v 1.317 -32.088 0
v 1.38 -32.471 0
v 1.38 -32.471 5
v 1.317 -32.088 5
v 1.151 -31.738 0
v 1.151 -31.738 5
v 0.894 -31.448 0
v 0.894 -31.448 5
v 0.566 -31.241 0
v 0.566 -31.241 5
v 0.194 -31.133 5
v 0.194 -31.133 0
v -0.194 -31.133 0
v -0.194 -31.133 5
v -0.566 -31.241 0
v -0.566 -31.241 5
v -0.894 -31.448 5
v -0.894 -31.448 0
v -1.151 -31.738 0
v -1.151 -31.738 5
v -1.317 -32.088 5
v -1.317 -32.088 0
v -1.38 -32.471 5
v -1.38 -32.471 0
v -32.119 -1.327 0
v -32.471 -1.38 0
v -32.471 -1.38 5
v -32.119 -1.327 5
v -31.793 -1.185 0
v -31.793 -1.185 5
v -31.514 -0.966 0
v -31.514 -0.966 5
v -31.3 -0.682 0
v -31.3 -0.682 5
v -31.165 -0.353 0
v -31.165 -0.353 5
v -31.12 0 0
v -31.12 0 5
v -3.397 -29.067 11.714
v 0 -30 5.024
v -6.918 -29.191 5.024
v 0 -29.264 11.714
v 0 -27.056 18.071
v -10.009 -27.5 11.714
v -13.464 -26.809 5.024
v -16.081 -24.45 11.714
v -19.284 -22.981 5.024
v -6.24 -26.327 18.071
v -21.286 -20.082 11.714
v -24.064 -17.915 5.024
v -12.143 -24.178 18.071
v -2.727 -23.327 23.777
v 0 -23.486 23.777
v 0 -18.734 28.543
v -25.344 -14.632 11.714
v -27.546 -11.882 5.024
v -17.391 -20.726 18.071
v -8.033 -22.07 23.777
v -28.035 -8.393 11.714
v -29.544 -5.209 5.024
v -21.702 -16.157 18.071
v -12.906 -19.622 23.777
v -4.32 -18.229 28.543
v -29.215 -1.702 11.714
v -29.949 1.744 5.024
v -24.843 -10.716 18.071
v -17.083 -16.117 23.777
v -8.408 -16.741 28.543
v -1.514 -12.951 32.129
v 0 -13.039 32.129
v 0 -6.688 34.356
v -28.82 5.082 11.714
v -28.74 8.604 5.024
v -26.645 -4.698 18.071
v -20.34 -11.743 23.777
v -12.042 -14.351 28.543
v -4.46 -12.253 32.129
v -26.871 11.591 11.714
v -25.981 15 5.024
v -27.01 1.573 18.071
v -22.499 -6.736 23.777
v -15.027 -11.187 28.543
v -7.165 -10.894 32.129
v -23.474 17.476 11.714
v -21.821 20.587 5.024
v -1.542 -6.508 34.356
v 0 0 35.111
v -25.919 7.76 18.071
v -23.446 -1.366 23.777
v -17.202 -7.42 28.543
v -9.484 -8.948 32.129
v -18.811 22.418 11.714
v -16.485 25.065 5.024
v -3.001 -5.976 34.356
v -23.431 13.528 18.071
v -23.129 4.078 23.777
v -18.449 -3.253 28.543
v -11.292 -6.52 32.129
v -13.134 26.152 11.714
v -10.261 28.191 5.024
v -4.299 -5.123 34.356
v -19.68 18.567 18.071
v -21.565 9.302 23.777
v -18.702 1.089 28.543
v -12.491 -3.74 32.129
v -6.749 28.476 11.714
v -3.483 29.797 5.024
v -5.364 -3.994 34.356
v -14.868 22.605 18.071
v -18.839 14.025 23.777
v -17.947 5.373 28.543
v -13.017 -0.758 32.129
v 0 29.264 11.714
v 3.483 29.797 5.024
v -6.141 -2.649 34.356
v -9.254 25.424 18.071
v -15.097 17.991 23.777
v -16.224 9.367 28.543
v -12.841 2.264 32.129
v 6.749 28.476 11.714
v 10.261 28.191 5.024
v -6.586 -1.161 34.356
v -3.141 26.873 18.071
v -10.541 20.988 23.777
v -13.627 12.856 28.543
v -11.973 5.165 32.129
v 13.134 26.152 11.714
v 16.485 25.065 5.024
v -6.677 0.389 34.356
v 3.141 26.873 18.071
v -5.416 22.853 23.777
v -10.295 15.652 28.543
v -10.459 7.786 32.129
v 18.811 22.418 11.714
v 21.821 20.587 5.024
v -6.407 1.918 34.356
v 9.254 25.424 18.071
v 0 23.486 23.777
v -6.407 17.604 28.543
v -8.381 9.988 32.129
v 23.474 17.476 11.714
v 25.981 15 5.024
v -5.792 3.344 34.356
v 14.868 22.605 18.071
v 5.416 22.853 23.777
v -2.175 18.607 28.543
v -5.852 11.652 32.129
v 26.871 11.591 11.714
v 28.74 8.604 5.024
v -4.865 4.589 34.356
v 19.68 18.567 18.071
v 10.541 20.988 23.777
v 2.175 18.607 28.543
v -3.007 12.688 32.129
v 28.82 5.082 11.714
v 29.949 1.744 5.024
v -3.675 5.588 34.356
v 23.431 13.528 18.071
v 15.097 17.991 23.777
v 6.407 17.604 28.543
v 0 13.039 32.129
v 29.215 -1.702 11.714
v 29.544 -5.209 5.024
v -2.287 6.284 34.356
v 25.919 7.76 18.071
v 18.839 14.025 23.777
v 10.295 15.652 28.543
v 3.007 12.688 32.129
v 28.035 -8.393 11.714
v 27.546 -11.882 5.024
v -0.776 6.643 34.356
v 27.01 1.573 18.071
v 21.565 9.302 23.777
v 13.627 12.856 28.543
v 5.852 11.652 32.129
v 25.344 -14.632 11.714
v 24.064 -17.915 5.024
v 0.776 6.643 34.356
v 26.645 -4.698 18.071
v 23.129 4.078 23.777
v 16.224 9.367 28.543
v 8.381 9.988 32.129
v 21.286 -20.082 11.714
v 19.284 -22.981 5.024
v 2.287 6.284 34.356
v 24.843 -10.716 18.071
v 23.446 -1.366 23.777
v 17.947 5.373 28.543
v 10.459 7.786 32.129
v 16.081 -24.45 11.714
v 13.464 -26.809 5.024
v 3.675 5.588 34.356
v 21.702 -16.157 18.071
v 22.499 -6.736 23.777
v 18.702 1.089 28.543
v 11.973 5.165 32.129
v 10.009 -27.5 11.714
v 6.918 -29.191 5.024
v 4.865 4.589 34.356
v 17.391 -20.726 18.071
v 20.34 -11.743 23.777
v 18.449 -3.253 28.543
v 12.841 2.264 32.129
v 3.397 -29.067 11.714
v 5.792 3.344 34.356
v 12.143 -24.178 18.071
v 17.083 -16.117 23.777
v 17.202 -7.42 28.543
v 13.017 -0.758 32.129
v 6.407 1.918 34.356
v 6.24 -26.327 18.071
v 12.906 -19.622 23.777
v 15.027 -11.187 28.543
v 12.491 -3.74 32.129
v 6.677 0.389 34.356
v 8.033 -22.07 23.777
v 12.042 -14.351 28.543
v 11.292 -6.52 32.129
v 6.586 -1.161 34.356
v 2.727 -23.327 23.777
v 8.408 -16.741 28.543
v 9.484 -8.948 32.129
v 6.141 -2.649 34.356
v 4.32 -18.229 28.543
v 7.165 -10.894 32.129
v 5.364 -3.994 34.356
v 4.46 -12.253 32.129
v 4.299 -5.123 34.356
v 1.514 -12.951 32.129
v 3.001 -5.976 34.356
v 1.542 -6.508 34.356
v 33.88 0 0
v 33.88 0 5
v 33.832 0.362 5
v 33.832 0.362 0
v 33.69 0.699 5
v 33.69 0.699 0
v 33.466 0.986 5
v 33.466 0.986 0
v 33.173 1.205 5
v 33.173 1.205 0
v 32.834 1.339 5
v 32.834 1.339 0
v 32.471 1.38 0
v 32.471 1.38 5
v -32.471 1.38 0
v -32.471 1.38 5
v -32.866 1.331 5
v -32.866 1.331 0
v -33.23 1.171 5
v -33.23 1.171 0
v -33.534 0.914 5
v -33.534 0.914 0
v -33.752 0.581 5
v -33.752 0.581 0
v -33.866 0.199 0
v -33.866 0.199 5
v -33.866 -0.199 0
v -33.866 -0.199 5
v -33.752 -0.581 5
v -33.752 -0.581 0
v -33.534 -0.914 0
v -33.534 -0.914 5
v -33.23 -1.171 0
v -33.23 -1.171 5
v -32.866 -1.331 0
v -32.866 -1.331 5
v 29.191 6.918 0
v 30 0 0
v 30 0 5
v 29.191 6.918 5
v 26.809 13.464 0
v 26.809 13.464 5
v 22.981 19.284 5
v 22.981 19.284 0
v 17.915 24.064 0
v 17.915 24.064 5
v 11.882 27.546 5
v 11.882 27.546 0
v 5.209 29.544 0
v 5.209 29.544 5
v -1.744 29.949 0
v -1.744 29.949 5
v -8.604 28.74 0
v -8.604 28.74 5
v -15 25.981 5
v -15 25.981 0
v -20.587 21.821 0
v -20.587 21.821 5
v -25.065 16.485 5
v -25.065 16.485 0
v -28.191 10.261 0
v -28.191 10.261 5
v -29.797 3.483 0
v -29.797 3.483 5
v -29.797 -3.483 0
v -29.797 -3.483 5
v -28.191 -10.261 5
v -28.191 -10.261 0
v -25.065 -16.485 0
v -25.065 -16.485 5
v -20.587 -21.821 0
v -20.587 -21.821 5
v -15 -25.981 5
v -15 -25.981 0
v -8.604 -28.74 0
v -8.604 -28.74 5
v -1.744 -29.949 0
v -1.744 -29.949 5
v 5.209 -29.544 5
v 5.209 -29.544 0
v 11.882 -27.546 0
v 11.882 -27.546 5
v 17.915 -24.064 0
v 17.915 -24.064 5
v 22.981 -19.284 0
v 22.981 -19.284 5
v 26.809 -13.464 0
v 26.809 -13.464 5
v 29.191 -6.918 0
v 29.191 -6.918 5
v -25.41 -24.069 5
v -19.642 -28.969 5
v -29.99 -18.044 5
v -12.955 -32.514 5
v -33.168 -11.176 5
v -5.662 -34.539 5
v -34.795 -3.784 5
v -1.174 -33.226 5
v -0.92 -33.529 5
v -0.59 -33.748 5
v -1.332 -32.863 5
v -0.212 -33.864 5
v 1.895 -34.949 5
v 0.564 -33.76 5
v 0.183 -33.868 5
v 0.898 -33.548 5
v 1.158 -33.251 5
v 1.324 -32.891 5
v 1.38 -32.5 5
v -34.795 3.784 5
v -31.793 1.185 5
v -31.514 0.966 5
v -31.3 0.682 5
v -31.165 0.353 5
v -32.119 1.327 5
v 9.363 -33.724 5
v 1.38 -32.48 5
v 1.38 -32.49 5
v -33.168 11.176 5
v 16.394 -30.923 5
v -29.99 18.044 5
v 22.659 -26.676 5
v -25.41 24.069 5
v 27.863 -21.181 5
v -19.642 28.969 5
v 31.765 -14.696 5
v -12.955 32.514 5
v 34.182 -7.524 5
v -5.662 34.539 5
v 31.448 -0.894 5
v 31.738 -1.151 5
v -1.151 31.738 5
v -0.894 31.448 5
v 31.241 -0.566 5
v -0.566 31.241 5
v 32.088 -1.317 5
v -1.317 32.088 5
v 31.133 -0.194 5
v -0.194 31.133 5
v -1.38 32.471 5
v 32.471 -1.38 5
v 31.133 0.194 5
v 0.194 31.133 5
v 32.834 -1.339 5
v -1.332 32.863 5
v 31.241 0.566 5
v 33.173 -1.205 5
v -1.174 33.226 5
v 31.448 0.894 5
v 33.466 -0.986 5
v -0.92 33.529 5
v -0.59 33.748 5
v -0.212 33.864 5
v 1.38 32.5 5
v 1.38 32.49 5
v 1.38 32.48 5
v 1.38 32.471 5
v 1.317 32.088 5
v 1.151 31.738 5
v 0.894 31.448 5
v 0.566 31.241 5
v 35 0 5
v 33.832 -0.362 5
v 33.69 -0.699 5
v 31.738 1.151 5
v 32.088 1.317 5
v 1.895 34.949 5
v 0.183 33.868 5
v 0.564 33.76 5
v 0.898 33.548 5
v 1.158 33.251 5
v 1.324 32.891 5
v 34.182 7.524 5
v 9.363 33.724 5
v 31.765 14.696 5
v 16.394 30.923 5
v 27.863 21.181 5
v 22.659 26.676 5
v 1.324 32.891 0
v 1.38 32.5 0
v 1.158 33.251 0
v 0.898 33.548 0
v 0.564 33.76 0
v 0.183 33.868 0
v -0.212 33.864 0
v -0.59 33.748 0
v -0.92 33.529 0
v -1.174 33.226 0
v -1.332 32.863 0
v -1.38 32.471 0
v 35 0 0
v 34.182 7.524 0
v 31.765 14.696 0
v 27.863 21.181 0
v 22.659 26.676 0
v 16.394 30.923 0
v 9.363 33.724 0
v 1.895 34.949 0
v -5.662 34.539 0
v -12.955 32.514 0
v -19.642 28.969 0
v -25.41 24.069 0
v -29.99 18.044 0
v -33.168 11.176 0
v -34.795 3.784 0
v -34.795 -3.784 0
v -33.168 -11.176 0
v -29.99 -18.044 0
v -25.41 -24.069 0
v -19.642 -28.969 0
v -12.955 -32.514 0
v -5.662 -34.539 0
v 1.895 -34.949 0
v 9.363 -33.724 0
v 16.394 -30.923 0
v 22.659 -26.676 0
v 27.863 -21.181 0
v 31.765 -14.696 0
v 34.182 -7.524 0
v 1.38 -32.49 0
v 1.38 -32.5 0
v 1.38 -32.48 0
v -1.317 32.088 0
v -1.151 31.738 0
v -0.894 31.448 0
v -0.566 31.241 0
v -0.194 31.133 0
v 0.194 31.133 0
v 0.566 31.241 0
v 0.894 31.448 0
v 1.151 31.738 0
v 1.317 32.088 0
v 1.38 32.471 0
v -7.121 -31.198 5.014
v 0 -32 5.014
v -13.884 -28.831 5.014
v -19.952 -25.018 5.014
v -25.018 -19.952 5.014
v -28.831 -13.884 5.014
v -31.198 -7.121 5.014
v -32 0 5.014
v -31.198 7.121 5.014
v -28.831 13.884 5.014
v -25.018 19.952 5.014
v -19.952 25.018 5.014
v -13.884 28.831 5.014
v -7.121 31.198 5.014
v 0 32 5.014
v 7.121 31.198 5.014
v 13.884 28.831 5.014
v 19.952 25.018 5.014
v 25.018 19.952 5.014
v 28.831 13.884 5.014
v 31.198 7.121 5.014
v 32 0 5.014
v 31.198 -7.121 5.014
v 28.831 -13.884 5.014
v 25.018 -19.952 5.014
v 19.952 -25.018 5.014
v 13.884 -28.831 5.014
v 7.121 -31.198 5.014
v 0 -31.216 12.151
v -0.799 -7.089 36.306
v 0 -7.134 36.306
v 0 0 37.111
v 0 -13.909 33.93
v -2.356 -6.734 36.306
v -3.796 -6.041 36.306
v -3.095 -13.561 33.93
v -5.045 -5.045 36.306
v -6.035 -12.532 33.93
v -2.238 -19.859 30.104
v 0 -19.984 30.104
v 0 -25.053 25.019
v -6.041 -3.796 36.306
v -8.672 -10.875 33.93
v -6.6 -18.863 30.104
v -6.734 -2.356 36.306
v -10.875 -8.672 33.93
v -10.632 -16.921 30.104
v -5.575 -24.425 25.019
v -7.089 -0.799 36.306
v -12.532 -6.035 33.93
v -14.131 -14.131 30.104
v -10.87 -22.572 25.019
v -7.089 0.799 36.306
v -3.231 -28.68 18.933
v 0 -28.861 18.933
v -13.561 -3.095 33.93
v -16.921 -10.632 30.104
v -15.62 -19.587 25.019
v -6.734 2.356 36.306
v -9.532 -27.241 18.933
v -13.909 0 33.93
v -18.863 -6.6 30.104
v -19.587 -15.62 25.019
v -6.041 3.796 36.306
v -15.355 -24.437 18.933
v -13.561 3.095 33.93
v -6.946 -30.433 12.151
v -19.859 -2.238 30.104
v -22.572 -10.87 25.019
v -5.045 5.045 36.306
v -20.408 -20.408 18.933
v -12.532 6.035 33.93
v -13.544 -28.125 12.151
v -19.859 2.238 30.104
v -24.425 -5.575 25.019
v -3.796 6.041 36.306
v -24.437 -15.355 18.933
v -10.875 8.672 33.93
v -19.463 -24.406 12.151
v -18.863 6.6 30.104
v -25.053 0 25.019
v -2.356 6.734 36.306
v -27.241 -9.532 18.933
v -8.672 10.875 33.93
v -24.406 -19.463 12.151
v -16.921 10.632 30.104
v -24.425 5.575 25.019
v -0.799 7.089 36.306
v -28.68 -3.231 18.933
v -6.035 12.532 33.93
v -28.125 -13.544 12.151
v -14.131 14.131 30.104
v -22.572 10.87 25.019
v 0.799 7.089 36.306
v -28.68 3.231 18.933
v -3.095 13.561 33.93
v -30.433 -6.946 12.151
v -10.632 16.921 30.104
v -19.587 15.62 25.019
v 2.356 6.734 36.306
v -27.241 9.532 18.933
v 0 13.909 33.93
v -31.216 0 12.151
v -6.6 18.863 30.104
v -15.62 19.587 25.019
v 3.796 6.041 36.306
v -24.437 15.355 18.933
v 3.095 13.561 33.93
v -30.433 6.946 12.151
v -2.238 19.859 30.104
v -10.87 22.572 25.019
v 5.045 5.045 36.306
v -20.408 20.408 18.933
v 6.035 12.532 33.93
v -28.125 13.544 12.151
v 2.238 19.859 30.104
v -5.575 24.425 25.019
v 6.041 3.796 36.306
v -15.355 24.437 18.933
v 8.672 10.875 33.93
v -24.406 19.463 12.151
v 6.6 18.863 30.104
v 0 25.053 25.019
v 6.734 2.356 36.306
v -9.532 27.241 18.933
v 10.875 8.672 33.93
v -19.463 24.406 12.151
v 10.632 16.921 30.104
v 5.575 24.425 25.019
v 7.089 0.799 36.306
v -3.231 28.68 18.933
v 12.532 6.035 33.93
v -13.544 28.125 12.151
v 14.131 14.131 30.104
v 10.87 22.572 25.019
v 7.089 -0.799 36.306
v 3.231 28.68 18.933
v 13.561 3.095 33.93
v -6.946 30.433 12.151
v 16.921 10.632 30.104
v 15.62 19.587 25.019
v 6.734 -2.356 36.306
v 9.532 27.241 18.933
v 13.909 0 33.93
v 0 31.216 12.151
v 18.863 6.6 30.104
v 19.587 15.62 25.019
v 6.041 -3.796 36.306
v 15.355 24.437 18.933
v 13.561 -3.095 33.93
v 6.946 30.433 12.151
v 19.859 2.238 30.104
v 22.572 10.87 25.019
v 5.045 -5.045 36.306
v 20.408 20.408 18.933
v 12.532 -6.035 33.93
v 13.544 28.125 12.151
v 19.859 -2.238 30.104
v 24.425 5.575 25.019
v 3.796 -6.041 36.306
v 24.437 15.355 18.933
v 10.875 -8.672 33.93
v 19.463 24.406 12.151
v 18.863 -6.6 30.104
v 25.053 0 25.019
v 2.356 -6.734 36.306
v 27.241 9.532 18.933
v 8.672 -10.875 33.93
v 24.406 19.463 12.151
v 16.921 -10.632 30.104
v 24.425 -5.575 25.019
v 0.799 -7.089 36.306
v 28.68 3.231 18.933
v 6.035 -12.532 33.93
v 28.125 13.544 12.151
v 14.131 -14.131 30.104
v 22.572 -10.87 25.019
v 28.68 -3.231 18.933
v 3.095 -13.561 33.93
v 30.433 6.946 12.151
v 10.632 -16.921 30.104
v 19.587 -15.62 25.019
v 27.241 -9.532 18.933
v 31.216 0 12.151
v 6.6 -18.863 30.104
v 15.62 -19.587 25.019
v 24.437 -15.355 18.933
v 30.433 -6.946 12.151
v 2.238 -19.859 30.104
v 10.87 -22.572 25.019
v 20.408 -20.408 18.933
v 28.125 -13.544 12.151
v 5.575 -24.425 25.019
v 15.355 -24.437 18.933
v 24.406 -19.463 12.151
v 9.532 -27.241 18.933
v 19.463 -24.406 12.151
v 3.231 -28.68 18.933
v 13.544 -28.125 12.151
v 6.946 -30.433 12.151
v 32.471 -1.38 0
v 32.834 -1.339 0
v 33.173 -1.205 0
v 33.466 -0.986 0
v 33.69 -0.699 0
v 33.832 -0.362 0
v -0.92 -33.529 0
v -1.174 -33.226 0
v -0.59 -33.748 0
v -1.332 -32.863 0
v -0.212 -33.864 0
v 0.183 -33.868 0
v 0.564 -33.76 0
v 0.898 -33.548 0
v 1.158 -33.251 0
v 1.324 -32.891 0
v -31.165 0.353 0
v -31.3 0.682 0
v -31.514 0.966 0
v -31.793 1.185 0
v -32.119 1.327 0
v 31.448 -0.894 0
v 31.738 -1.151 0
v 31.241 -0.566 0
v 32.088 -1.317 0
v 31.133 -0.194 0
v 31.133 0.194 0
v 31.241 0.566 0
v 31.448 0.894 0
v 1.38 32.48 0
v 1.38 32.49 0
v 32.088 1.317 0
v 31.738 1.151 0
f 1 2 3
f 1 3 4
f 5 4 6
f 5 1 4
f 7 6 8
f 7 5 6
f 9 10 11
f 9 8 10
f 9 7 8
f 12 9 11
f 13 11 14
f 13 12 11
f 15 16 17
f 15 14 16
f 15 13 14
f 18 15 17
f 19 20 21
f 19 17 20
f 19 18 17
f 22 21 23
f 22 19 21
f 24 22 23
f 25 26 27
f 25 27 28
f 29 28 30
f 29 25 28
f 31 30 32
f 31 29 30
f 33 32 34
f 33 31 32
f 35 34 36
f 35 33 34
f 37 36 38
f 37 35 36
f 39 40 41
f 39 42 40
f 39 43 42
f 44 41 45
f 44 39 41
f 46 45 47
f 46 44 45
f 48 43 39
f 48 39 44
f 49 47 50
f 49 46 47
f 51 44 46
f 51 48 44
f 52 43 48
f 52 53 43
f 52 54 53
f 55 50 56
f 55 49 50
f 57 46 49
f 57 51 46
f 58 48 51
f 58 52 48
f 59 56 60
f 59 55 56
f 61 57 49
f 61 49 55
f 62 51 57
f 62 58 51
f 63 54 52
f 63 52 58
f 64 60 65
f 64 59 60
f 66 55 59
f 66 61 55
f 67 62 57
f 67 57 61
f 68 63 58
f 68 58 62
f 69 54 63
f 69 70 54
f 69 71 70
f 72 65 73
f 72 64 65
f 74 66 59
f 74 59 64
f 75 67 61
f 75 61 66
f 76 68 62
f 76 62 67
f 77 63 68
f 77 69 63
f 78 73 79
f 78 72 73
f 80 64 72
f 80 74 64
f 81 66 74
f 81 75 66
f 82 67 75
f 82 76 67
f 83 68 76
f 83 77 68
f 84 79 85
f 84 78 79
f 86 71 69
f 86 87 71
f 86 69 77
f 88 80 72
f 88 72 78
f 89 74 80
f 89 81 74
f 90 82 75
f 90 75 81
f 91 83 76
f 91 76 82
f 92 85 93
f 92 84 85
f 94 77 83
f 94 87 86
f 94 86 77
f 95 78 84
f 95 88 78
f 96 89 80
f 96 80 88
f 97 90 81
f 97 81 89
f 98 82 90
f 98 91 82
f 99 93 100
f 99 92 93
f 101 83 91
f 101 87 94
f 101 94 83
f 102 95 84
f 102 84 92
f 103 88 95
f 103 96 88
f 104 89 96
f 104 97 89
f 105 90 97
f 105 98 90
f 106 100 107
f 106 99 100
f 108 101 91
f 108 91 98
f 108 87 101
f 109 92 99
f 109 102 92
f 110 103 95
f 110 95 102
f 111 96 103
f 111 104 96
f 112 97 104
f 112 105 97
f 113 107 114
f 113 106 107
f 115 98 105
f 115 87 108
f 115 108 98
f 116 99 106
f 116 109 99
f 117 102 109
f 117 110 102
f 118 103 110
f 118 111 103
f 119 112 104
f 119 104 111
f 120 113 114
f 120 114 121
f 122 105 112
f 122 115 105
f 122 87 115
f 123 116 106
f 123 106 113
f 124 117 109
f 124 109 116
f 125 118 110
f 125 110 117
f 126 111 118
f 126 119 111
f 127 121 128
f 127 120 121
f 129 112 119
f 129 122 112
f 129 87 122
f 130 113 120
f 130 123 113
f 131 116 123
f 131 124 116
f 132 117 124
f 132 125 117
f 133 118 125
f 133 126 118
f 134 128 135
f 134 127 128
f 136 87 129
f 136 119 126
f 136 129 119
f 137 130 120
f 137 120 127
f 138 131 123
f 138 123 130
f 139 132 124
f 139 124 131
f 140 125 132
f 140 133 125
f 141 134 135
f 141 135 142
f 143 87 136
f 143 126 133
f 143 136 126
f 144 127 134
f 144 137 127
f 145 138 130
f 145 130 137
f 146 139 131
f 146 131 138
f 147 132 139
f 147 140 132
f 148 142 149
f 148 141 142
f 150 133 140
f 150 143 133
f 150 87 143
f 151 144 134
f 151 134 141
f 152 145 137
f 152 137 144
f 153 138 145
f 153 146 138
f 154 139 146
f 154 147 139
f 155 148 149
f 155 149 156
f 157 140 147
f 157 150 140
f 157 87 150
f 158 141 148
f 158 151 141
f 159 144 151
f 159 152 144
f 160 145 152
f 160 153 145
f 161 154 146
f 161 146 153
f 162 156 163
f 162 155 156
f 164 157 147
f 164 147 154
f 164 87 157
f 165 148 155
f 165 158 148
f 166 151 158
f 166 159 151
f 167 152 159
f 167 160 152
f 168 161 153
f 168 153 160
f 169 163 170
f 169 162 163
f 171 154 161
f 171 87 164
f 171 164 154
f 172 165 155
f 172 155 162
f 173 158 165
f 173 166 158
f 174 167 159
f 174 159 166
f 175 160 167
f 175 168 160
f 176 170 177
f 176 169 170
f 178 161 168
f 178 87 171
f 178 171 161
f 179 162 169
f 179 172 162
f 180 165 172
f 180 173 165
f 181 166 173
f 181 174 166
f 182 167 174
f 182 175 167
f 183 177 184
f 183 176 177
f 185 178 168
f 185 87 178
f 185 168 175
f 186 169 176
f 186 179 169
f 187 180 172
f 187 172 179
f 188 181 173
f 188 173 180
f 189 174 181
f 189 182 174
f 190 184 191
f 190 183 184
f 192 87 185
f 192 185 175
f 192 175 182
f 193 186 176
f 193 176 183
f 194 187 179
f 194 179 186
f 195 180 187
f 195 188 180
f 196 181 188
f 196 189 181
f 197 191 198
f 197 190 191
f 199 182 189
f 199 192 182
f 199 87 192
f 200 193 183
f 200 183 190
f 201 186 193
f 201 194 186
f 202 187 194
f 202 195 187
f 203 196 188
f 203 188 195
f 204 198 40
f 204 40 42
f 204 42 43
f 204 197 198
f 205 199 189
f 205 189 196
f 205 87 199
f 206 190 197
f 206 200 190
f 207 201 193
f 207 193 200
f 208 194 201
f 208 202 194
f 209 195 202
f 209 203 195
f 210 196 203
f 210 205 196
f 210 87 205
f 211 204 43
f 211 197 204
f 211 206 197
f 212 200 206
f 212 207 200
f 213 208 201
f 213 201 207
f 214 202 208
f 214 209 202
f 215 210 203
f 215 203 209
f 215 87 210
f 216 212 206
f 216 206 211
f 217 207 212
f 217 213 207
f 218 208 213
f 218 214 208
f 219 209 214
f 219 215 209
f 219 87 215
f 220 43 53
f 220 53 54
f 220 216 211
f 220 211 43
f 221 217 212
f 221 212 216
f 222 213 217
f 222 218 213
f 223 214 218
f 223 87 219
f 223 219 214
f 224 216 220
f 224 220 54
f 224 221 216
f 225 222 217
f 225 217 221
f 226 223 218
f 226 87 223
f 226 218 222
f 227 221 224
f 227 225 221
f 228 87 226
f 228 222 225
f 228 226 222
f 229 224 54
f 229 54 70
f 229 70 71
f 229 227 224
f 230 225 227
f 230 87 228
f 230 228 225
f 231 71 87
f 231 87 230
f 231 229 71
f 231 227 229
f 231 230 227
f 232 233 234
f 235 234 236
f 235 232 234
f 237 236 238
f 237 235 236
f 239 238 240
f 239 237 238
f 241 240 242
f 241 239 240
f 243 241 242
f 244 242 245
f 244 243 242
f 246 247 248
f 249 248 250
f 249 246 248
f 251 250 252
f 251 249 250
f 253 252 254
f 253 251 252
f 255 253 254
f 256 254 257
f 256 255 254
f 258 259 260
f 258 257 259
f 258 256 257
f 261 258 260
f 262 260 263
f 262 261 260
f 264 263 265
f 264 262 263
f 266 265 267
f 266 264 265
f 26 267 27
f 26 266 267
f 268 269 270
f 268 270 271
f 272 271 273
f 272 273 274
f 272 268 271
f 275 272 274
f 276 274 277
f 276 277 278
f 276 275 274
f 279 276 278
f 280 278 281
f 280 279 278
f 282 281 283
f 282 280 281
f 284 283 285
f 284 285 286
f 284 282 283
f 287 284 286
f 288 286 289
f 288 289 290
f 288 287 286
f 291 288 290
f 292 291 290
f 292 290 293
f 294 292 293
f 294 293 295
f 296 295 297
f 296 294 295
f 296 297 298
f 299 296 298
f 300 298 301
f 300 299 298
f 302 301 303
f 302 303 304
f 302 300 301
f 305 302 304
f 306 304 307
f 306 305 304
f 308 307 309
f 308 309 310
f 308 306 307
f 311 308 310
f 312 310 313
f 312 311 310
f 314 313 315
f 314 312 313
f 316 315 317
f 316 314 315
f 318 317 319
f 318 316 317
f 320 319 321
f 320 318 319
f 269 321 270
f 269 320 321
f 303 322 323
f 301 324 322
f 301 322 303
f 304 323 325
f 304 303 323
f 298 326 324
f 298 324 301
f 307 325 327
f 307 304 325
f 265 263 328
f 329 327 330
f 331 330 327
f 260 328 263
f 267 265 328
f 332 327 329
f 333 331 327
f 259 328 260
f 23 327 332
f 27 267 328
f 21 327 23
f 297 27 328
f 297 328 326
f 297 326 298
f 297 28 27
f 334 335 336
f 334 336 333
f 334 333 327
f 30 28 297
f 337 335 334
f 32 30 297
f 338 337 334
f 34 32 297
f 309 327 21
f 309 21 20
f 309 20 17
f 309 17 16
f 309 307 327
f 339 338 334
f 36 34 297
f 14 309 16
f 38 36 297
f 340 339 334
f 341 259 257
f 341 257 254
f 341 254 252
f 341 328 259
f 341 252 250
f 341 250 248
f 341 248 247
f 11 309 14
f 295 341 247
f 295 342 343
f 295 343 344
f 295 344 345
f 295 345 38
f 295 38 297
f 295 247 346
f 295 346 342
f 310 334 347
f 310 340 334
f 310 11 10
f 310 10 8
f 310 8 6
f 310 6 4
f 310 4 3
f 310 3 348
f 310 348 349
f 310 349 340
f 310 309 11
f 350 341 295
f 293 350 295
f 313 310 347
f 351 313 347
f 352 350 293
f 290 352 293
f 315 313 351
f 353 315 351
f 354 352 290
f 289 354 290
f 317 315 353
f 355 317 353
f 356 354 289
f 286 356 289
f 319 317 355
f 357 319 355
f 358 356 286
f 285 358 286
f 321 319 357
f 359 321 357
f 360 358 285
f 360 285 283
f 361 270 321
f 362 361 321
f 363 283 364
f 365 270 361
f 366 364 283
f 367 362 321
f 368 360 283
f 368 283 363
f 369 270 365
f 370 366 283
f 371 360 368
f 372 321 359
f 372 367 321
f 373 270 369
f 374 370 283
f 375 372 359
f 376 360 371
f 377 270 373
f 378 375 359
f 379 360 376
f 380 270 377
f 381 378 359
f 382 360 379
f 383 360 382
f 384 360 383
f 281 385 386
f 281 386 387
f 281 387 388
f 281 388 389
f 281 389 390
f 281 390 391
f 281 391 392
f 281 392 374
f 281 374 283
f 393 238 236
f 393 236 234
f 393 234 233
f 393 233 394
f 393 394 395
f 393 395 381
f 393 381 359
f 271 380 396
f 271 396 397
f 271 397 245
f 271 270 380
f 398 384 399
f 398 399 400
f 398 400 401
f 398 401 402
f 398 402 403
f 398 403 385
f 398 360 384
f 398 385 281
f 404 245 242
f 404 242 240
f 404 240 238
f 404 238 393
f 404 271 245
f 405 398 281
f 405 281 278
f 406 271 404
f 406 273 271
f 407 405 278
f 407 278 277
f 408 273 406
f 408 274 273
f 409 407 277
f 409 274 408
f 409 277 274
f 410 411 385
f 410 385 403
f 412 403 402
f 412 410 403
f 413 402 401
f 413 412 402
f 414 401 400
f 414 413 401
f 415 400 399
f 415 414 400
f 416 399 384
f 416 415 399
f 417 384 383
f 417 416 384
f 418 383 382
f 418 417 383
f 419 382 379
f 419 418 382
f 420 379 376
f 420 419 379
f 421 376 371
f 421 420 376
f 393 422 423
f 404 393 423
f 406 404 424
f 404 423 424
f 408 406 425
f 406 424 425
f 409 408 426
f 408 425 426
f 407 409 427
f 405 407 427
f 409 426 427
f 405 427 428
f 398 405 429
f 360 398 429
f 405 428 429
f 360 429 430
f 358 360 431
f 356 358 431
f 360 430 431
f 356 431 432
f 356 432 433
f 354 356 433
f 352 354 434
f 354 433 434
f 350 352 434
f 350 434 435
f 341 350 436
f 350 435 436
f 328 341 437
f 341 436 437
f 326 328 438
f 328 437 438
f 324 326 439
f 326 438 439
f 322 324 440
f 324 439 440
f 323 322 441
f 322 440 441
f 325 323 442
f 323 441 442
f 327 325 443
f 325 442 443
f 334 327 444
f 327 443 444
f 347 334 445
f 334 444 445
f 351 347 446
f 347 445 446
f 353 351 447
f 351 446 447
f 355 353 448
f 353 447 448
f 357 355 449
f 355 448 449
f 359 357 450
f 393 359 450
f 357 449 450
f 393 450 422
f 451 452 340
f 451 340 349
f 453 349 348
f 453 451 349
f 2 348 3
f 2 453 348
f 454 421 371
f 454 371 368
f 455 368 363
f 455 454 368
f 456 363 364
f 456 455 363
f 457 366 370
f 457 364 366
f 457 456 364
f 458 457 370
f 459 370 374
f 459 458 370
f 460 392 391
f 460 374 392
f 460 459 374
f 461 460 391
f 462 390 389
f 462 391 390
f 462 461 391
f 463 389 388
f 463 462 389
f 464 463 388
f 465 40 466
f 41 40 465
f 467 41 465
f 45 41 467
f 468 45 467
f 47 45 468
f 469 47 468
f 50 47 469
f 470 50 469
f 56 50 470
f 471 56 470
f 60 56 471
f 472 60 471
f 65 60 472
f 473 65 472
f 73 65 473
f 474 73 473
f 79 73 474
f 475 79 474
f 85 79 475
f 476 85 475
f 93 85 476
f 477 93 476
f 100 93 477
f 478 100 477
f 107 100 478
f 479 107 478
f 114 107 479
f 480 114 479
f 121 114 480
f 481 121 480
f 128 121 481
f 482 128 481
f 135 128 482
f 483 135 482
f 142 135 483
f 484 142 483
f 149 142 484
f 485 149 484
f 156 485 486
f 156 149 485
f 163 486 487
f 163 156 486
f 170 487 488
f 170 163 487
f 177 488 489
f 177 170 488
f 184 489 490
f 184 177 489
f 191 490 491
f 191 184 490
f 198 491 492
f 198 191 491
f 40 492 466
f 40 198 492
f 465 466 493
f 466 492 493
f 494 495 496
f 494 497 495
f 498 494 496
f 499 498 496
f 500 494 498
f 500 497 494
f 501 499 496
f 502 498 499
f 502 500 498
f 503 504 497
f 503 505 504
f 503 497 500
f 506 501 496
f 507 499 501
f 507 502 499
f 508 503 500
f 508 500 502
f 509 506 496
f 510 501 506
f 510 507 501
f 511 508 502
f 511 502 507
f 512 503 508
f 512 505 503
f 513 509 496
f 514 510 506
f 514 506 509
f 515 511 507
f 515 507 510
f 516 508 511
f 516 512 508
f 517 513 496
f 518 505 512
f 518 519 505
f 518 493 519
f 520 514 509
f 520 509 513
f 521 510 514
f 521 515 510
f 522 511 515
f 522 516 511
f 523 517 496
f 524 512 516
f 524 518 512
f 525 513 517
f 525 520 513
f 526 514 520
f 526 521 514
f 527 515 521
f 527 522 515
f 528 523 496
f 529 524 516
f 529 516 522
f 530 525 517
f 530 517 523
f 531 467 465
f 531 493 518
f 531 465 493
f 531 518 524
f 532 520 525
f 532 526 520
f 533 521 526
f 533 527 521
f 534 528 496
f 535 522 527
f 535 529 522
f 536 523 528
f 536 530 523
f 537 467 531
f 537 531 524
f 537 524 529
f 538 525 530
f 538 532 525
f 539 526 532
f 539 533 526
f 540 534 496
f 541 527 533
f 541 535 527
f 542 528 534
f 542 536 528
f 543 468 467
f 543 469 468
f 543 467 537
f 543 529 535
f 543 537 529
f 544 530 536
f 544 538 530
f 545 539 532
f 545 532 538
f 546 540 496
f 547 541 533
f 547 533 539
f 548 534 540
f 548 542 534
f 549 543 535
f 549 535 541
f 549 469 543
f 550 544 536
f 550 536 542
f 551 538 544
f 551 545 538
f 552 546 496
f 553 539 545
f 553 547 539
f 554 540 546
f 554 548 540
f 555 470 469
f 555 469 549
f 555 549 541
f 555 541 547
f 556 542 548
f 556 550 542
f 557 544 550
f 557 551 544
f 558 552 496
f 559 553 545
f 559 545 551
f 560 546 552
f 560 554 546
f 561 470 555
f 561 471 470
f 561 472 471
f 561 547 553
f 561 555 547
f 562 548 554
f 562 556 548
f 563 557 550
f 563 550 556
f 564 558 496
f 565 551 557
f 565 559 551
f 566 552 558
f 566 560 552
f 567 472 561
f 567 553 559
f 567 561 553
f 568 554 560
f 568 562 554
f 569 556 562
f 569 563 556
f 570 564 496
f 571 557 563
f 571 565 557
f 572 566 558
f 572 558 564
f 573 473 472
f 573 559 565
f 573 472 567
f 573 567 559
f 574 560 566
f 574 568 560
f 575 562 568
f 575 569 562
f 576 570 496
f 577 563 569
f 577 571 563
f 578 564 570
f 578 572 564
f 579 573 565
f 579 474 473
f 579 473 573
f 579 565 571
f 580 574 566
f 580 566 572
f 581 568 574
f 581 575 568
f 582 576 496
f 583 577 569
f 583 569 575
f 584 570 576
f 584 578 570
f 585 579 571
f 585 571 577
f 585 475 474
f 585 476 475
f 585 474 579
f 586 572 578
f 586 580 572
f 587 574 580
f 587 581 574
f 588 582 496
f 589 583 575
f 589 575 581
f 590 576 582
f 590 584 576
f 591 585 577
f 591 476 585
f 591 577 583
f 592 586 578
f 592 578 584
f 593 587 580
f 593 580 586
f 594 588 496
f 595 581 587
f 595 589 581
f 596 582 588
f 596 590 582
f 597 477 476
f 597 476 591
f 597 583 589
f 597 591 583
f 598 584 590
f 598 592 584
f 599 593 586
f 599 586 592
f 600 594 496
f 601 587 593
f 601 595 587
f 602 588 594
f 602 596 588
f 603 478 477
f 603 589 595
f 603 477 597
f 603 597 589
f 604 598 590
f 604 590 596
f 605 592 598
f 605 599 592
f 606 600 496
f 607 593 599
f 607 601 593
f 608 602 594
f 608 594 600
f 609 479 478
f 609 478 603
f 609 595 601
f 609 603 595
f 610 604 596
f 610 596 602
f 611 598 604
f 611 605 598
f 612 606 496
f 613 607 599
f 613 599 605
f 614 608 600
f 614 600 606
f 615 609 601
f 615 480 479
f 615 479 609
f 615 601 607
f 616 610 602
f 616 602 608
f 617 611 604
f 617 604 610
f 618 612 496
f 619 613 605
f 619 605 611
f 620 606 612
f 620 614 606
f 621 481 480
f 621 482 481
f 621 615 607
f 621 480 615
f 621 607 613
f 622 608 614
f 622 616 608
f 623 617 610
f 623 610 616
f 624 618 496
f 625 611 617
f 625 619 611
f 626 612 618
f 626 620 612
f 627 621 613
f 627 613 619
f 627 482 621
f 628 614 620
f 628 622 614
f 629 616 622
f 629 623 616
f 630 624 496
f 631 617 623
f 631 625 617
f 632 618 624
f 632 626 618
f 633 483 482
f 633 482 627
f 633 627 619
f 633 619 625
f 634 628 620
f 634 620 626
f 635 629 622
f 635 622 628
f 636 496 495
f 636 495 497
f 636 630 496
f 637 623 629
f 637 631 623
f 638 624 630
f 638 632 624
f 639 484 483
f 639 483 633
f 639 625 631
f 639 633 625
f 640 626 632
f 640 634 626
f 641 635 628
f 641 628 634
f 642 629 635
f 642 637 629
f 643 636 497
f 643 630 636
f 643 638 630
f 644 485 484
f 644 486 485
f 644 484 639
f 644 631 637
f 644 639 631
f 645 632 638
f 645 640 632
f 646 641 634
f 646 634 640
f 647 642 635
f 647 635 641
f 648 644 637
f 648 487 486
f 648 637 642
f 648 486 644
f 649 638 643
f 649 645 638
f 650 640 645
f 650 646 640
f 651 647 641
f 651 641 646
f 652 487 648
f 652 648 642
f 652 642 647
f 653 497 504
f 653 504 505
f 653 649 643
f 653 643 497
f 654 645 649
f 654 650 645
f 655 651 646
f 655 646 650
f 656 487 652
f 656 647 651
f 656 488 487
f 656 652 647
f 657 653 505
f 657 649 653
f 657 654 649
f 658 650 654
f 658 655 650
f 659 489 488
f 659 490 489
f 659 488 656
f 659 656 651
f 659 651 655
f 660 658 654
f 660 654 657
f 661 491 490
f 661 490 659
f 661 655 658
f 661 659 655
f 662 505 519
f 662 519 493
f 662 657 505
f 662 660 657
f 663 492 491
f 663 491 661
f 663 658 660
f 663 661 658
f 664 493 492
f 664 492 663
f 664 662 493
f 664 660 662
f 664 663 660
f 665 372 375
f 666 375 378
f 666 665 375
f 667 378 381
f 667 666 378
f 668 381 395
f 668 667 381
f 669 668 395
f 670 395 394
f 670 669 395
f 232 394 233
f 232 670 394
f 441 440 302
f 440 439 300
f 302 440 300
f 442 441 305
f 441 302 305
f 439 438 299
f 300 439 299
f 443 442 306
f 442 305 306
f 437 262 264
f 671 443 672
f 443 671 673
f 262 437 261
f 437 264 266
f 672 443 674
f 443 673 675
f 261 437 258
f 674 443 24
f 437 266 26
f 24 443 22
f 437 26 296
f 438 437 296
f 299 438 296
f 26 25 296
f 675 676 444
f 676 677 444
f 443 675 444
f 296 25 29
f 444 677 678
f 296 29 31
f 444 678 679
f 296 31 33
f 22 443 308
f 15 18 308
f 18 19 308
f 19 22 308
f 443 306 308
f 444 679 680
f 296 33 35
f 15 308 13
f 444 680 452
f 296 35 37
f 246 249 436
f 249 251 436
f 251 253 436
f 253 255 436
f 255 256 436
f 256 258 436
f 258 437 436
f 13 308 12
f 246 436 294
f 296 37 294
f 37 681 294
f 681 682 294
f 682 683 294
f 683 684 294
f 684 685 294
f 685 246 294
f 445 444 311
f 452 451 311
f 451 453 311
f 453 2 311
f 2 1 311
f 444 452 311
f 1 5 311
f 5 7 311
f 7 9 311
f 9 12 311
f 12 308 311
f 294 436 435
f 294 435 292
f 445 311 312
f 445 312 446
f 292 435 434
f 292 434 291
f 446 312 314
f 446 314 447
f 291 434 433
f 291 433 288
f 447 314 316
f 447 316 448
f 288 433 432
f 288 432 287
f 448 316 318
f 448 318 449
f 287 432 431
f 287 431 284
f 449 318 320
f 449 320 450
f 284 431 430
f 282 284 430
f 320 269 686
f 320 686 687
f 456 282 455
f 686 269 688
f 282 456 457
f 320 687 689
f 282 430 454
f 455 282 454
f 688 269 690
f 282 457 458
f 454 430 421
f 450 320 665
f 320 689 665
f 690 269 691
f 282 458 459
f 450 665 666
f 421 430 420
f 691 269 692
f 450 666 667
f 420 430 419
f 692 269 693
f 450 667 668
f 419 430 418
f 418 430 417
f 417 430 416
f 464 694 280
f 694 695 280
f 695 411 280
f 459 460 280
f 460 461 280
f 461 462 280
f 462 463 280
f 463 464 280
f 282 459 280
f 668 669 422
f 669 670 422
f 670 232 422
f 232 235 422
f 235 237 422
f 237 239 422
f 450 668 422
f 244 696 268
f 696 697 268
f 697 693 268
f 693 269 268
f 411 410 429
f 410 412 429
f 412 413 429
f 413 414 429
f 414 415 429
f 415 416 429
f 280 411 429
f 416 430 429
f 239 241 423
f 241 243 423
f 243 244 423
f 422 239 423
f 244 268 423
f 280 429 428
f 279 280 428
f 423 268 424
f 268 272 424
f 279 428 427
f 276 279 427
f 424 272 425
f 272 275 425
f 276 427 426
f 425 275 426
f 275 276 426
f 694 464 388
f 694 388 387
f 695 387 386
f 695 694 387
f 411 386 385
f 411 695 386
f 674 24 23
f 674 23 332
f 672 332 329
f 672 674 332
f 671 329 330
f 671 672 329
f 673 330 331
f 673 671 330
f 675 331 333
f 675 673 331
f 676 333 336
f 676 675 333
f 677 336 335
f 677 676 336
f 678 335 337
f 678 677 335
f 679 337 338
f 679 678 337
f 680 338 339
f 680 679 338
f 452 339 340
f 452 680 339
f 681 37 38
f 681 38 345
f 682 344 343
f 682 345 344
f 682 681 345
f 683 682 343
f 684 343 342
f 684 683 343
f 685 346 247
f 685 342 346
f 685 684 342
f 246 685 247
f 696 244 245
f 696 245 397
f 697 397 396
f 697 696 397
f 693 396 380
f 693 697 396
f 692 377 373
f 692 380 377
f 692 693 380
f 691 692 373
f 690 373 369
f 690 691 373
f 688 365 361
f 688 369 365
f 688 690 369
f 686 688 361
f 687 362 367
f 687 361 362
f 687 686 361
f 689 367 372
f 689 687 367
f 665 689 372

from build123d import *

# Parameters (mm, degrees)
F0_R     = 35
F0_R_2   = 30
F1_DEPTH = 5
F3_DEPTH = 25


with BuildPart() as f1:
    # F0 (on Top) → F1 (new body)
    with BuildSketch(Plane.XY):
        Circle(F0_R)
        Circle(F0_R_2, mode=Mode.SUBTRACT)
    extrude(amount=F1_DEPTH)

    # F2 (on Top) → F3 (cut)
    with BuildSketch(Plane.XY):
        with BuildLine():
            ThreePointArc((-1.3799724468, 32.4706894914), (0, 32.5), (1.3799724468, 32.4706894914))
            ThreePointArc((1.3799724468, 32.4706894914), (1.3802058756, 32.4853439195), (1.3802836882, 32.5))
            ThreePointArc((1.3802836882, 32.5), (-0.0146560805, 33.8802058756), (-1.3799724468, 32.4706894914))
        make_face()
        with BuildLine():
            ThreePointArc((-1.3799724468, 32.4706894914), (0, 31.1197163118), (1.3799724468, 32.4706894914))
            ThreePointArc((1.3799724468, 32.4706894914), (0, 32.5), (-1.3799724468, 32.4706894914))
        make_face()
        with BuildLine():
            ThreePointArc((32.4706894914, 1.3799724468), (32.4926715466, 0.6901418441), (32.5, 0))
            ThreePointArc((32.5, 0), (32.4926715466, -0.6901418441), (32.4706894914, -1.3799724468))
            ThreePointArc((32.4706894914, -1.3799724468), (33.4655895202, -0.986316348), (33.8802836882, 0))
            ThreePointArc((33.8802836882, 0), (33.4655895202, 0.986316348), (32.4706894914, 1.3799724468))
        make_face()
        with BuildLine():
            ThreePointArc((32.4706894914, -1.3799724468), (32.4926715466, -0.6901418441), (32.5, 0))
            ThreePointArc((32.5, 0), (32.4926715466, 0.6901418441), (32.4706894914, 1.3799724468))
            ThreePointArc((32.4706894914, 1.3799724468), (31.1197163118, 0), (32.4706894914, -1.3799724468))
        make_face()
        with BuildLine():
            ThreePointArc((-32.4706894914, -1.3799724468), (-32.5, 0), (-32.4706894914, 1.3799724468))
            ThreePointArc((-32.4706894914, 1.3799724468), (-33.8802836882, 0), (-32.4706894914, -1.3799724468))
        make_face()
        with BuildLine():
            ThreePointArc((-31.1197163118, 0), (-31.513683652, 0.9655895202), (-32.4706894914, 1.3799724468))
            ThreePointArc((-32.4706894914, 1.3799724468), (-32.5, 0), (-32.4706894914, -1.3799724468))
            ThreePointArc((-32.4706894914, -1.3799724468), (-31.513683652, -0.9655895202), (-31.1197163118, 0))
        make_face()
        with BuildLine():
            ThreePointArc((1.3802836882, -32.5), (1.3802058756, -32.4853439195), (1.3799724468, -32.4706894914))
            ThreePointArc((1.3799724468, -32.4706894914), (0, -32.5), (-1.3799724468, -32.4706894914))
            ThreePointArc((-1.3799724468, -32.4706894914), (-0.0146560805, -33.8802058756), (1.3802836882, -32.5))
        make_face()
        with BuildLine():
            ThreePointArc((-1.3799724468, -32.4706894914), (0, -32.5), (1.3799724468, -32.4706894914))
            ThreePointArc((1.3799724468, -32.4706894914), (0, -31.1197163118), (-1.3799724468, -32.4706894914))
        make_face()
    extrude(amount=F3_DEPTH, mode=Mode.SUBTRACT)


with BuildPart() as f5:
    # F4 (on Right) → F5 (revolve)
    with BuildSketch(Plane.YZ):
        with BuildLine():
            ThreePointArc((-29.9998722602, 5.0236273346), (-21.2441332108, 26.2934022241), (0, 35.1111737266))
            Line((0, 35.1111737266), (0, 37.1111737266))
            ThreePointArc((0, 37.1111737266), (-22.661727469, 27.7042281488), (-31.9998526254, 5.0140554843))
            Line((-31.9998526254, 5.0140554843), (-29.9998722602, 5.0236273346))
        make_face()
    revolve(axis=Axis((0, 0, 36.1111737266), (0, 0, -1)))


solid = Compound([f1.part, f5.part])
